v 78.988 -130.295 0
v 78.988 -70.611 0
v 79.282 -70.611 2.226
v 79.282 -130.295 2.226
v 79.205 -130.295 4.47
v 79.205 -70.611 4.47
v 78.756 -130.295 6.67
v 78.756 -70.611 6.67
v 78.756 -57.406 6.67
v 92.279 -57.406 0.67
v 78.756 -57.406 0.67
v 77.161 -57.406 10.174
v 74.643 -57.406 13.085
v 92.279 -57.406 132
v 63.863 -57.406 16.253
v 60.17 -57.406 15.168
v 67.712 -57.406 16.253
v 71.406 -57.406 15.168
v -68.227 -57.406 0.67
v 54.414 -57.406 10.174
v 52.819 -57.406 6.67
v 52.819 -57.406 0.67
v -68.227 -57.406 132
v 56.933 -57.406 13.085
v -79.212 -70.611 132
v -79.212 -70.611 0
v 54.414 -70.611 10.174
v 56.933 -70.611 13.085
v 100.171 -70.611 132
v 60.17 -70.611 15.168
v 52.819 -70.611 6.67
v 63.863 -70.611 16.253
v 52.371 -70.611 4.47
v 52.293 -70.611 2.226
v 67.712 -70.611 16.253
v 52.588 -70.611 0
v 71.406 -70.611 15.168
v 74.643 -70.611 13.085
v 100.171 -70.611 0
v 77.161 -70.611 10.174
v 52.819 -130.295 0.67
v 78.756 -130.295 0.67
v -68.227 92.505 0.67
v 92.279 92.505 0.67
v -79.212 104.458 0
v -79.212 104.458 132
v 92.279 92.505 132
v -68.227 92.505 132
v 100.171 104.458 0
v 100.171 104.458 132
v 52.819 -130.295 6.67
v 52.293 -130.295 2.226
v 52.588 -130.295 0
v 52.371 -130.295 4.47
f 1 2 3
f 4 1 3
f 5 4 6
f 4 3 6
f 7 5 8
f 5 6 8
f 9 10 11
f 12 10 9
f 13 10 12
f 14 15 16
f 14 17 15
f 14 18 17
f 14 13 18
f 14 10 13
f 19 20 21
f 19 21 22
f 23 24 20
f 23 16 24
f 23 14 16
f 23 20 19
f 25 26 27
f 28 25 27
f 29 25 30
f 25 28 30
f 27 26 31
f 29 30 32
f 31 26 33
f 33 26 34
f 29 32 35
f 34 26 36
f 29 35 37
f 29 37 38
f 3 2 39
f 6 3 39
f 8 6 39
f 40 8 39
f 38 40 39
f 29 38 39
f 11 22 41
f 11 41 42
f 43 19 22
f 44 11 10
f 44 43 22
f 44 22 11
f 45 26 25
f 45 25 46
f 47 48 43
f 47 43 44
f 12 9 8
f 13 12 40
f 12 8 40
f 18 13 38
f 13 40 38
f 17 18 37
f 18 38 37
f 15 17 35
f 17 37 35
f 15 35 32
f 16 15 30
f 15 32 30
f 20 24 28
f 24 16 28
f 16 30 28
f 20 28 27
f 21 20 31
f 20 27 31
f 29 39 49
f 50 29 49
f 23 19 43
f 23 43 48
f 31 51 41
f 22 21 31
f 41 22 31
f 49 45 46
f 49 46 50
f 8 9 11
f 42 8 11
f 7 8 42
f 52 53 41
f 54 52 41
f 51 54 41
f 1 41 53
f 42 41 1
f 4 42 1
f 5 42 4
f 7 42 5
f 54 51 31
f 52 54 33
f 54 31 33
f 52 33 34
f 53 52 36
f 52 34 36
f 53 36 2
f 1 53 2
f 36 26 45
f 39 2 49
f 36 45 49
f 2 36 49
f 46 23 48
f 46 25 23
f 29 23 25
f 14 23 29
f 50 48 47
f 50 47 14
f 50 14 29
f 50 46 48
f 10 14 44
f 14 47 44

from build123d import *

# Parameters (mm, degrees)
F0_W      = 179.383456707
F0_H      = 175.0688403845
F0_W_2    = 160.5059653521
F0_H_2    = 146.9108834863
F1_DEPTH  = 132
F3_DEPTH  = 25
F5_DEPTH  = 10
F6_DEPTH  = 10
F7_W      = 160.5059653521
F7_H      = 6.6701923497
F8_DEPTH  = 163
F9_DEPTH  = 6
F10_DEPTH = 3
F11_DEPTH = 59.8


with BuildPart() as f1:
    # F0 (on Top) → F1 (new body)
    with BuildSketch(Plane.XY):
        with Locations((10.4796737432, 16.923636198)):
            Rectangle(F0_W, F0_H)
        with Locations((12.0261907578, 19.04932037)):
            Rectangle(F0_W_2, F0_H_2, mode=Mode.SUBTRACT)
    extrude(amount=F1_DEPTH)

    # F2 (on face) → F3 (cut)
    with BuildSketch(Plane.XZ.offset(70.6107839942)):
        with BuildLine():
            Line((52.587673068, 0), (78.987672925, 0))
            ThreePointArc((78.987672925, 0), (65.7876729965, 16.3912356025), (52.587673068, 0))
        make_face()
    extrude(amount=-F3_DEPTH, mode=Mode.SUBTRACT)

    # F4 (on face) → F5 (join)
    with BuildSketch(Plane(origin=(0, 0, 0), x_dir=(1, 0, 0), z_dir=(0, 0, -1))):
        Polygon((52.587673068, 54.4061213732), (-68.2267919183, 54.4061213732), (-68.2267919183, -92.5047621131), (92.2791734338, -92.5047621131), (92.2791734338, 54.4061213732), (78.987672925, 54.4061213732), align=None)
    extrude(amount=-F5_DEPTH)

    # F6 (cut): a face of the model
    f6_faces = [f1.faces().sort_by_distance(p)[0] for p in [
        (12.0261907578, 19.04932037, 10),
    ]]
    extrude(f6_faces, amount=-F6_DEPTH, mode=Mode.SUBTRACT)

    # F7 (on face) → F8 (join)
    with BuildSketch(Plane.XZ.offset(-92.5047621131)):
        with Locations((12.0261907578, 3.3350961749)):
            Rectangle(F7_W, F7_H)
    extrude(amount=F8_DEPTH)

    # F9 (cut): a face of the model
    f9_faces = [f1.faces().sort_by_distance(p)[0] for p in [
        (12.9610636672, 17.6320948964, 6.6701923497),
    ]]
    extrude(f9_faces, amount=-F9_DEPTH, mode=Mode.SUBTRACT)

    # F10 (cut): a face of the model
    f10_faces = [f1.faces().sort_by_distance(p)[0] for p in [
        (11.1413753664, -54.4061213732, 67.3034038031),
    ]]
    extrude(f10_faces, amount=-F10_DEPTH, mode=Mode.SUBTRACT)

    # F11 (add): a face of the model
    f11_faces = [f1.faces().sort_by_distance(p)[0] for p in [
        (52.5633202811, -70.4952378869, 3.3399666354),
    ]]
    extrude(f11_faces, amount=F11_DEPTH)


solid = f1.part
